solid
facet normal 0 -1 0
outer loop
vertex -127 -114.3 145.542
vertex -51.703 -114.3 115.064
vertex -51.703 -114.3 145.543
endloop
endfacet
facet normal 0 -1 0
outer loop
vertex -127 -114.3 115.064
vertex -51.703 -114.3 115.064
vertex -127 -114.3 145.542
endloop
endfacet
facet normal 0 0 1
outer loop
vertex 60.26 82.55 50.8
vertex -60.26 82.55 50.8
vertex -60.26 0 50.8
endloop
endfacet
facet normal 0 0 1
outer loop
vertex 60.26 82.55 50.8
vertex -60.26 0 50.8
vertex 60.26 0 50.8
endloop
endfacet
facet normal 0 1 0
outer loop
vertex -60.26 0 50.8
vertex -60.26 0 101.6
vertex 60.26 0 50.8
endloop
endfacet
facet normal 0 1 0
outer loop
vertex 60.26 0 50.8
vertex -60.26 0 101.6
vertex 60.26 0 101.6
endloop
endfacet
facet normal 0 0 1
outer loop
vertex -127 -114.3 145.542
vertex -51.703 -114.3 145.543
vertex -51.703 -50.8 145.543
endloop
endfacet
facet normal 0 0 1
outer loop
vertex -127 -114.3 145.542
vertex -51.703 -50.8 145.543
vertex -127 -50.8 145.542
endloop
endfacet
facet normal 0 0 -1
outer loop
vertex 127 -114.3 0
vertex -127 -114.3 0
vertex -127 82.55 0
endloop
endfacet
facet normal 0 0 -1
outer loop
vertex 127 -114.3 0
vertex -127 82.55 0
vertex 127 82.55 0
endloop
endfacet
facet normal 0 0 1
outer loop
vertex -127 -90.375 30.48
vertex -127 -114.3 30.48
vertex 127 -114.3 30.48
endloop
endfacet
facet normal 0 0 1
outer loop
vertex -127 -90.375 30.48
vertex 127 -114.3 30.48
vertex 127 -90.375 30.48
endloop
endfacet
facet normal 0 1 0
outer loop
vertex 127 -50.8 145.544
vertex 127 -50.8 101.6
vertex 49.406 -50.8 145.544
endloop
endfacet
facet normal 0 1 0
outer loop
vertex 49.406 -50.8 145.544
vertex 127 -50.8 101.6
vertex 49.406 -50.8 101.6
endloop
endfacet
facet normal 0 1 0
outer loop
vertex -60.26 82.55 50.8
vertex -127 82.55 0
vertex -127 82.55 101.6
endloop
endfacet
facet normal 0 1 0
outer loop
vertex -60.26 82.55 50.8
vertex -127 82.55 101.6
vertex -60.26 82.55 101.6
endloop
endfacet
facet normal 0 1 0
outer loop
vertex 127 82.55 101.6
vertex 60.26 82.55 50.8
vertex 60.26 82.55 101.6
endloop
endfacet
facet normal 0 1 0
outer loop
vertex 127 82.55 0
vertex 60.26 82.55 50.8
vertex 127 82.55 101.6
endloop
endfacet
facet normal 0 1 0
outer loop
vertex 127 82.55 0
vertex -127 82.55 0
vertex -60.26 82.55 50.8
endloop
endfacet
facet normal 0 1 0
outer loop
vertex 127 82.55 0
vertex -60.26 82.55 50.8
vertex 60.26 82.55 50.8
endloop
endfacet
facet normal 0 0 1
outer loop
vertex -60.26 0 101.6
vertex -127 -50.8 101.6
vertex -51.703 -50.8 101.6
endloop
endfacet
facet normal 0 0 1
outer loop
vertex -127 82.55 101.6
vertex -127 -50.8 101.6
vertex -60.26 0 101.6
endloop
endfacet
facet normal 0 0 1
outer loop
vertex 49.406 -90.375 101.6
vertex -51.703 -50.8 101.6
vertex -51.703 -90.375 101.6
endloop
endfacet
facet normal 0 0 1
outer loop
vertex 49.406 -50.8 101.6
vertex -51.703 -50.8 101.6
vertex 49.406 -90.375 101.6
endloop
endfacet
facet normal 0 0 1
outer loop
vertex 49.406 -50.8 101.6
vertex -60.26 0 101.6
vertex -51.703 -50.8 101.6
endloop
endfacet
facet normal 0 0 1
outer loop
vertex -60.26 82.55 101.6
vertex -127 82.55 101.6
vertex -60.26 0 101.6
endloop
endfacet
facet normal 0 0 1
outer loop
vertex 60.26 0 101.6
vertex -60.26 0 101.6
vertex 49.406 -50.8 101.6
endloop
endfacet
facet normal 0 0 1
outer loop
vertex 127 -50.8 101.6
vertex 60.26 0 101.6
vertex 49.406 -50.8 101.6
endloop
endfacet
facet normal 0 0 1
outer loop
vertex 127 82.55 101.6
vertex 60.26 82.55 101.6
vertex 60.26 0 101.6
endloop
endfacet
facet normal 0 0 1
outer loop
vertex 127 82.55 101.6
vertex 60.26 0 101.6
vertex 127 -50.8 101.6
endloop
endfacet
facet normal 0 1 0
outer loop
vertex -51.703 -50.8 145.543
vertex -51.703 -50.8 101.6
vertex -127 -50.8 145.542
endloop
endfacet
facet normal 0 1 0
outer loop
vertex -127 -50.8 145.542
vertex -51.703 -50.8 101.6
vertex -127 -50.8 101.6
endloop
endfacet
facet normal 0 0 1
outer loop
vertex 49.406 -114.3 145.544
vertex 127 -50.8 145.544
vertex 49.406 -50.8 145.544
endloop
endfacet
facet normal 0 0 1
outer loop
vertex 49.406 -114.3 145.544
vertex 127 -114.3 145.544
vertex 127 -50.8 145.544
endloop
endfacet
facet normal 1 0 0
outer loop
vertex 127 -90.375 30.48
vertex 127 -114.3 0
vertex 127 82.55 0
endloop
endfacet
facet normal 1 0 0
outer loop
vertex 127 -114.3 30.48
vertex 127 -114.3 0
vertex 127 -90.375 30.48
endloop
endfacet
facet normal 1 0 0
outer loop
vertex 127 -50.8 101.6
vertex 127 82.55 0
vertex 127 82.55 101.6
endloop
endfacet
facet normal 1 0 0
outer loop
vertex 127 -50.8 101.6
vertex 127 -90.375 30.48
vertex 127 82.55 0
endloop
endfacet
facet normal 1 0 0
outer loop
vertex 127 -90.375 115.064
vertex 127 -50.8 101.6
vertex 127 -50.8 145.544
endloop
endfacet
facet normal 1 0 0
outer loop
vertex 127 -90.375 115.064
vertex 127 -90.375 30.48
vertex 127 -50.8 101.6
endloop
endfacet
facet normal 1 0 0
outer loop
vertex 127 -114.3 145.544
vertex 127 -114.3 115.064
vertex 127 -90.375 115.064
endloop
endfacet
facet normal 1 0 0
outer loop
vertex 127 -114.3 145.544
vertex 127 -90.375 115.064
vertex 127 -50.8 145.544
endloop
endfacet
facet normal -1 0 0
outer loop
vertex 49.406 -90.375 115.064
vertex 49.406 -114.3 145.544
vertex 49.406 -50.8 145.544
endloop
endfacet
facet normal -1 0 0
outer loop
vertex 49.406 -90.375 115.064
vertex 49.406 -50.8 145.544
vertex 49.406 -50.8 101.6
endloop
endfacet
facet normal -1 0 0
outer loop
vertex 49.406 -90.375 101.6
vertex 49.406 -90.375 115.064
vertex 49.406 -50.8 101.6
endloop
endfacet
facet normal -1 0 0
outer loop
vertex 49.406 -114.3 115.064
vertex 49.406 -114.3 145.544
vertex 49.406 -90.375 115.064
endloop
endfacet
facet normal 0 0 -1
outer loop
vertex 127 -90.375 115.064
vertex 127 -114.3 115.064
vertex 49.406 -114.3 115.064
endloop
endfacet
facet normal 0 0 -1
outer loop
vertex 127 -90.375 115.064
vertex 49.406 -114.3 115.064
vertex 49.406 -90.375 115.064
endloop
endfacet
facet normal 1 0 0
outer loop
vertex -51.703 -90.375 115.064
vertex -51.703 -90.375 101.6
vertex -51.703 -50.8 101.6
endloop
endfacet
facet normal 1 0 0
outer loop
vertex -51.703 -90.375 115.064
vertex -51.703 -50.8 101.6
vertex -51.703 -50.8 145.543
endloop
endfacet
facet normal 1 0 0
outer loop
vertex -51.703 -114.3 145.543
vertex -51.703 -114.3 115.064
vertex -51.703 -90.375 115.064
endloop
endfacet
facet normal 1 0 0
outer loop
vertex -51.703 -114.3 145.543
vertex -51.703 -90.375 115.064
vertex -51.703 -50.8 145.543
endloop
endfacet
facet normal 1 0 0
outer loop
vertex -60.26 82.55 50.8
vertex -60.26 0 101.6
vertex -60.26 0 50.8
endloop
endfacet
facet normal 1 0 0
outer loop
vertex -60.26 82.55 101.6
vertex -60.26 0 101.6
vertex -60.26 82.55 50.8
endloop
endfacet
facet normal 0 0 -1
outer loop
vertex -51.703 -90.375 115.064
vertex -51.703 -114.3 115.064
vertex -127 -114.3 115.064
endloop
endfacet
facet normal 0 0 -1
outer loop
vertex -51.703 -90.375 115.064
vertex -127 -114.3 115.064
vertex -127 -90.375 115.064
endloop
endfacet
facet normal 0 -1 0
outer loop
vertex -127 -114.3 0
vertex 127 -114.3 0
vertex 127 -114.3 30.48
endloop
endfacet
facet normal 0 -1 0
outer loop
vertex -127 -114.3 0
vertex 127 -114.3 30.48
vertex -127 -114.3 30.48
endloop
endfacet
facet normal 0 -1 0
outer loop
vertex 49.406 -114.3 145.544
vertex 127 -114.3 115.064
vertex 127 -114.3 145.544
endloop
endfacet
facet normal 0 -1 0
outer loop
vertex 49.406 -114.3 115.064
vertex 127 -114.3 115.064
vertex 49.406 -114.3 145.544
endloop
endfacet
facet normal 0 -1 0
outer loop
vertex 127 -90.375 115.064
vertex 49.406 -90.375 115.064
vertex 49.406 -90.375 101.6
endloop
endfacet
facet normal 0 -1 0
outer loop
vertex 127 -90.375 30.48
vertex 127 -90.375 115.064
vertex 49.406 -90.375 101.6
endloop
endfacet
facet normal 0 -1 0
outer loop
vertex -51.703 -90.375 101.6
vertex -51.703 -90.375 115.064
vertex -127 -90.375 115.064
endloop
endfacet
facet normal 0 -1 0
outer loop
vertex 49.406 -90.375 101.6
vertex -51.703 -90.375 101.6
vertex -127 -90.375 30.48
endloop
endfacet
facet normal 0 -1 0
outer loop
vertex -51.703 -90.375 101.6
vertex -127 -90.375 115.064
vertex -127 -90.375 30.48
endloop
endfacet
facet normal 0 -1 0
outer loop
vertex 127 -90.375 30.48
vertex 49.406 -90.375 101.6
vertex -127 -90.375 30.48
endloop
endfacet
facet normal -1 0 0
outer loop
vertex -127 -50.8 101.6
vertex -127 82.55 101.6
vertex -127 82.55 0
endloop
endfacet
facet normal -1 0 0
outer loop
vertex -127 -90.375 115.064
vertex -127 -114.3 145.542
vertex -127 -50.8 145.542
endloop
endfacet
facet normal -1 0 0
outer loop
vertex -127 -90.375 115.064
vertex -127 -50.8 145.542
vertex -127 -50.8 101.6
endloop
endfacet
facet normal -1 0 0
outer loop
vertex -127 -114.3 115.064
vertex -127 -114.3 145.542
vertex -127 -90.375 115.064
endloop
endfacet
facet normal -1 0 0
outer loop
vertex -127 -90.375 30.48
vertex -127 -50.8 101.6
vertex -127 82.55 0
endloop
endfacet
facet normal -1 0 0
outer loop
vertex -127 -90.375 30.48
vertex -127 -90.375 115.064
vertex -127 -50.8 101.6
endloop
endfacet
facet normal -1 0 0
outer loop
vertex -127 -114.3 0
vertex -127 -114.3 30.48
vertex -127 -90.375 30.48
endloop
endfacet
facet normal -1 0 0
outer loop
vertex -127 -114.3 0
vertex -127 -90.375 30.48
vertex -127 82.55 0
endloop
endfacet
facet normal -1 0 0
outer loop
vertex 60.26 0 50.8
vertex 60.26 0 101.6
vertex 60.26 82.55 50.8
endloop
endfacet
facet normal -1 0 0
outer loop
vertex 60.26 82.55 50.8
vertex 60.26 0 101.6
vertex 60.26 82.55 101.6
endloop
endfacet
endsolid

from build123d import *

# Parameters (mm, degrees)
SKETCH1_W               = 254
SKETCH1_H               = 165.1
BOSS_EXTRUDE1_DEPTH     = 101.6
SKETCH2_W               = 120.519823472
SKETCH2_H               = 82.55
CUT_EXTRUDE1_DEPTH      = 50.8
BOSS_EXTRUDE2_DEPTH     = 31.75
CUT_EXTRUDE2_DEPTH      = 315.266796717
CUT_EXTRUDE2_DEPTH_BACK = 315.266796717
SKETCH4_W               = 84.584252786
SKETCH4_H               = 23.924522196


with BuildPart() as part:
    # Sketch1 → Boss-Extrude1 (new body)
    with BuildSketch(Plane.XY):
        Rectangle(SKETCH1_W, SKETCH1_H)
    extrude(amount=BOSS_EXTRUDE1_DEPTH)

    # Sketch2 → Cut-Extrude1 (cut)
    with BuildSketch(Plane.XY.offset(101.6)):
        with Locations((0, 41.275)):
            Rectangle(SKETCH2_W, SKETCH2_H)
    extrude(amount=-CUT_EXTRUDE1_DEPTH, mode=Mode.SUBTRACT)

    # Sketch3 → Boss-Extrude2 (add, symmetric)
    with BuildSketch(Plane(origin=(0, -82.55, 0), x_dir=(-1, 0, 0), z_dir=(0, -1, 0))):
        Polygon((-127, -101.6), (-127, -145.544252786), (-49.406360538, -145.543564589), (-49.406360538, -101.6), (51.702787408, -101.6), (51.702787408, -145.542667829), (127, -145.542), (127, -101.6), (127, 0), (-127, 0), align=None)
    extrude(amount=BOSS_EXTRUDE2_DEPTH, both=True)

    # Sketch4 → Cut-Extrude2 (cut, two sides: drawn at the far end of the back side and taken through both)
    with BuildSketch(Plane(origin=(127, 0, 0), x_dir=(0, 0, -1), z_dir=(1, 0, 0)).offset(-CUT_EXTRUDE2_DEPTH_BACK)):
        with Locations((-72.772126393, -102.337738902)):
            Rectangle(SKETCH4_W, SKETCH4_H)
    extrude(amount=CUT_EXTRUDE2_DEPTH + CUT_EXTRUDE2_DEPTH_BACK, mode=Mode.SUBTRACT)


solid = part.part
